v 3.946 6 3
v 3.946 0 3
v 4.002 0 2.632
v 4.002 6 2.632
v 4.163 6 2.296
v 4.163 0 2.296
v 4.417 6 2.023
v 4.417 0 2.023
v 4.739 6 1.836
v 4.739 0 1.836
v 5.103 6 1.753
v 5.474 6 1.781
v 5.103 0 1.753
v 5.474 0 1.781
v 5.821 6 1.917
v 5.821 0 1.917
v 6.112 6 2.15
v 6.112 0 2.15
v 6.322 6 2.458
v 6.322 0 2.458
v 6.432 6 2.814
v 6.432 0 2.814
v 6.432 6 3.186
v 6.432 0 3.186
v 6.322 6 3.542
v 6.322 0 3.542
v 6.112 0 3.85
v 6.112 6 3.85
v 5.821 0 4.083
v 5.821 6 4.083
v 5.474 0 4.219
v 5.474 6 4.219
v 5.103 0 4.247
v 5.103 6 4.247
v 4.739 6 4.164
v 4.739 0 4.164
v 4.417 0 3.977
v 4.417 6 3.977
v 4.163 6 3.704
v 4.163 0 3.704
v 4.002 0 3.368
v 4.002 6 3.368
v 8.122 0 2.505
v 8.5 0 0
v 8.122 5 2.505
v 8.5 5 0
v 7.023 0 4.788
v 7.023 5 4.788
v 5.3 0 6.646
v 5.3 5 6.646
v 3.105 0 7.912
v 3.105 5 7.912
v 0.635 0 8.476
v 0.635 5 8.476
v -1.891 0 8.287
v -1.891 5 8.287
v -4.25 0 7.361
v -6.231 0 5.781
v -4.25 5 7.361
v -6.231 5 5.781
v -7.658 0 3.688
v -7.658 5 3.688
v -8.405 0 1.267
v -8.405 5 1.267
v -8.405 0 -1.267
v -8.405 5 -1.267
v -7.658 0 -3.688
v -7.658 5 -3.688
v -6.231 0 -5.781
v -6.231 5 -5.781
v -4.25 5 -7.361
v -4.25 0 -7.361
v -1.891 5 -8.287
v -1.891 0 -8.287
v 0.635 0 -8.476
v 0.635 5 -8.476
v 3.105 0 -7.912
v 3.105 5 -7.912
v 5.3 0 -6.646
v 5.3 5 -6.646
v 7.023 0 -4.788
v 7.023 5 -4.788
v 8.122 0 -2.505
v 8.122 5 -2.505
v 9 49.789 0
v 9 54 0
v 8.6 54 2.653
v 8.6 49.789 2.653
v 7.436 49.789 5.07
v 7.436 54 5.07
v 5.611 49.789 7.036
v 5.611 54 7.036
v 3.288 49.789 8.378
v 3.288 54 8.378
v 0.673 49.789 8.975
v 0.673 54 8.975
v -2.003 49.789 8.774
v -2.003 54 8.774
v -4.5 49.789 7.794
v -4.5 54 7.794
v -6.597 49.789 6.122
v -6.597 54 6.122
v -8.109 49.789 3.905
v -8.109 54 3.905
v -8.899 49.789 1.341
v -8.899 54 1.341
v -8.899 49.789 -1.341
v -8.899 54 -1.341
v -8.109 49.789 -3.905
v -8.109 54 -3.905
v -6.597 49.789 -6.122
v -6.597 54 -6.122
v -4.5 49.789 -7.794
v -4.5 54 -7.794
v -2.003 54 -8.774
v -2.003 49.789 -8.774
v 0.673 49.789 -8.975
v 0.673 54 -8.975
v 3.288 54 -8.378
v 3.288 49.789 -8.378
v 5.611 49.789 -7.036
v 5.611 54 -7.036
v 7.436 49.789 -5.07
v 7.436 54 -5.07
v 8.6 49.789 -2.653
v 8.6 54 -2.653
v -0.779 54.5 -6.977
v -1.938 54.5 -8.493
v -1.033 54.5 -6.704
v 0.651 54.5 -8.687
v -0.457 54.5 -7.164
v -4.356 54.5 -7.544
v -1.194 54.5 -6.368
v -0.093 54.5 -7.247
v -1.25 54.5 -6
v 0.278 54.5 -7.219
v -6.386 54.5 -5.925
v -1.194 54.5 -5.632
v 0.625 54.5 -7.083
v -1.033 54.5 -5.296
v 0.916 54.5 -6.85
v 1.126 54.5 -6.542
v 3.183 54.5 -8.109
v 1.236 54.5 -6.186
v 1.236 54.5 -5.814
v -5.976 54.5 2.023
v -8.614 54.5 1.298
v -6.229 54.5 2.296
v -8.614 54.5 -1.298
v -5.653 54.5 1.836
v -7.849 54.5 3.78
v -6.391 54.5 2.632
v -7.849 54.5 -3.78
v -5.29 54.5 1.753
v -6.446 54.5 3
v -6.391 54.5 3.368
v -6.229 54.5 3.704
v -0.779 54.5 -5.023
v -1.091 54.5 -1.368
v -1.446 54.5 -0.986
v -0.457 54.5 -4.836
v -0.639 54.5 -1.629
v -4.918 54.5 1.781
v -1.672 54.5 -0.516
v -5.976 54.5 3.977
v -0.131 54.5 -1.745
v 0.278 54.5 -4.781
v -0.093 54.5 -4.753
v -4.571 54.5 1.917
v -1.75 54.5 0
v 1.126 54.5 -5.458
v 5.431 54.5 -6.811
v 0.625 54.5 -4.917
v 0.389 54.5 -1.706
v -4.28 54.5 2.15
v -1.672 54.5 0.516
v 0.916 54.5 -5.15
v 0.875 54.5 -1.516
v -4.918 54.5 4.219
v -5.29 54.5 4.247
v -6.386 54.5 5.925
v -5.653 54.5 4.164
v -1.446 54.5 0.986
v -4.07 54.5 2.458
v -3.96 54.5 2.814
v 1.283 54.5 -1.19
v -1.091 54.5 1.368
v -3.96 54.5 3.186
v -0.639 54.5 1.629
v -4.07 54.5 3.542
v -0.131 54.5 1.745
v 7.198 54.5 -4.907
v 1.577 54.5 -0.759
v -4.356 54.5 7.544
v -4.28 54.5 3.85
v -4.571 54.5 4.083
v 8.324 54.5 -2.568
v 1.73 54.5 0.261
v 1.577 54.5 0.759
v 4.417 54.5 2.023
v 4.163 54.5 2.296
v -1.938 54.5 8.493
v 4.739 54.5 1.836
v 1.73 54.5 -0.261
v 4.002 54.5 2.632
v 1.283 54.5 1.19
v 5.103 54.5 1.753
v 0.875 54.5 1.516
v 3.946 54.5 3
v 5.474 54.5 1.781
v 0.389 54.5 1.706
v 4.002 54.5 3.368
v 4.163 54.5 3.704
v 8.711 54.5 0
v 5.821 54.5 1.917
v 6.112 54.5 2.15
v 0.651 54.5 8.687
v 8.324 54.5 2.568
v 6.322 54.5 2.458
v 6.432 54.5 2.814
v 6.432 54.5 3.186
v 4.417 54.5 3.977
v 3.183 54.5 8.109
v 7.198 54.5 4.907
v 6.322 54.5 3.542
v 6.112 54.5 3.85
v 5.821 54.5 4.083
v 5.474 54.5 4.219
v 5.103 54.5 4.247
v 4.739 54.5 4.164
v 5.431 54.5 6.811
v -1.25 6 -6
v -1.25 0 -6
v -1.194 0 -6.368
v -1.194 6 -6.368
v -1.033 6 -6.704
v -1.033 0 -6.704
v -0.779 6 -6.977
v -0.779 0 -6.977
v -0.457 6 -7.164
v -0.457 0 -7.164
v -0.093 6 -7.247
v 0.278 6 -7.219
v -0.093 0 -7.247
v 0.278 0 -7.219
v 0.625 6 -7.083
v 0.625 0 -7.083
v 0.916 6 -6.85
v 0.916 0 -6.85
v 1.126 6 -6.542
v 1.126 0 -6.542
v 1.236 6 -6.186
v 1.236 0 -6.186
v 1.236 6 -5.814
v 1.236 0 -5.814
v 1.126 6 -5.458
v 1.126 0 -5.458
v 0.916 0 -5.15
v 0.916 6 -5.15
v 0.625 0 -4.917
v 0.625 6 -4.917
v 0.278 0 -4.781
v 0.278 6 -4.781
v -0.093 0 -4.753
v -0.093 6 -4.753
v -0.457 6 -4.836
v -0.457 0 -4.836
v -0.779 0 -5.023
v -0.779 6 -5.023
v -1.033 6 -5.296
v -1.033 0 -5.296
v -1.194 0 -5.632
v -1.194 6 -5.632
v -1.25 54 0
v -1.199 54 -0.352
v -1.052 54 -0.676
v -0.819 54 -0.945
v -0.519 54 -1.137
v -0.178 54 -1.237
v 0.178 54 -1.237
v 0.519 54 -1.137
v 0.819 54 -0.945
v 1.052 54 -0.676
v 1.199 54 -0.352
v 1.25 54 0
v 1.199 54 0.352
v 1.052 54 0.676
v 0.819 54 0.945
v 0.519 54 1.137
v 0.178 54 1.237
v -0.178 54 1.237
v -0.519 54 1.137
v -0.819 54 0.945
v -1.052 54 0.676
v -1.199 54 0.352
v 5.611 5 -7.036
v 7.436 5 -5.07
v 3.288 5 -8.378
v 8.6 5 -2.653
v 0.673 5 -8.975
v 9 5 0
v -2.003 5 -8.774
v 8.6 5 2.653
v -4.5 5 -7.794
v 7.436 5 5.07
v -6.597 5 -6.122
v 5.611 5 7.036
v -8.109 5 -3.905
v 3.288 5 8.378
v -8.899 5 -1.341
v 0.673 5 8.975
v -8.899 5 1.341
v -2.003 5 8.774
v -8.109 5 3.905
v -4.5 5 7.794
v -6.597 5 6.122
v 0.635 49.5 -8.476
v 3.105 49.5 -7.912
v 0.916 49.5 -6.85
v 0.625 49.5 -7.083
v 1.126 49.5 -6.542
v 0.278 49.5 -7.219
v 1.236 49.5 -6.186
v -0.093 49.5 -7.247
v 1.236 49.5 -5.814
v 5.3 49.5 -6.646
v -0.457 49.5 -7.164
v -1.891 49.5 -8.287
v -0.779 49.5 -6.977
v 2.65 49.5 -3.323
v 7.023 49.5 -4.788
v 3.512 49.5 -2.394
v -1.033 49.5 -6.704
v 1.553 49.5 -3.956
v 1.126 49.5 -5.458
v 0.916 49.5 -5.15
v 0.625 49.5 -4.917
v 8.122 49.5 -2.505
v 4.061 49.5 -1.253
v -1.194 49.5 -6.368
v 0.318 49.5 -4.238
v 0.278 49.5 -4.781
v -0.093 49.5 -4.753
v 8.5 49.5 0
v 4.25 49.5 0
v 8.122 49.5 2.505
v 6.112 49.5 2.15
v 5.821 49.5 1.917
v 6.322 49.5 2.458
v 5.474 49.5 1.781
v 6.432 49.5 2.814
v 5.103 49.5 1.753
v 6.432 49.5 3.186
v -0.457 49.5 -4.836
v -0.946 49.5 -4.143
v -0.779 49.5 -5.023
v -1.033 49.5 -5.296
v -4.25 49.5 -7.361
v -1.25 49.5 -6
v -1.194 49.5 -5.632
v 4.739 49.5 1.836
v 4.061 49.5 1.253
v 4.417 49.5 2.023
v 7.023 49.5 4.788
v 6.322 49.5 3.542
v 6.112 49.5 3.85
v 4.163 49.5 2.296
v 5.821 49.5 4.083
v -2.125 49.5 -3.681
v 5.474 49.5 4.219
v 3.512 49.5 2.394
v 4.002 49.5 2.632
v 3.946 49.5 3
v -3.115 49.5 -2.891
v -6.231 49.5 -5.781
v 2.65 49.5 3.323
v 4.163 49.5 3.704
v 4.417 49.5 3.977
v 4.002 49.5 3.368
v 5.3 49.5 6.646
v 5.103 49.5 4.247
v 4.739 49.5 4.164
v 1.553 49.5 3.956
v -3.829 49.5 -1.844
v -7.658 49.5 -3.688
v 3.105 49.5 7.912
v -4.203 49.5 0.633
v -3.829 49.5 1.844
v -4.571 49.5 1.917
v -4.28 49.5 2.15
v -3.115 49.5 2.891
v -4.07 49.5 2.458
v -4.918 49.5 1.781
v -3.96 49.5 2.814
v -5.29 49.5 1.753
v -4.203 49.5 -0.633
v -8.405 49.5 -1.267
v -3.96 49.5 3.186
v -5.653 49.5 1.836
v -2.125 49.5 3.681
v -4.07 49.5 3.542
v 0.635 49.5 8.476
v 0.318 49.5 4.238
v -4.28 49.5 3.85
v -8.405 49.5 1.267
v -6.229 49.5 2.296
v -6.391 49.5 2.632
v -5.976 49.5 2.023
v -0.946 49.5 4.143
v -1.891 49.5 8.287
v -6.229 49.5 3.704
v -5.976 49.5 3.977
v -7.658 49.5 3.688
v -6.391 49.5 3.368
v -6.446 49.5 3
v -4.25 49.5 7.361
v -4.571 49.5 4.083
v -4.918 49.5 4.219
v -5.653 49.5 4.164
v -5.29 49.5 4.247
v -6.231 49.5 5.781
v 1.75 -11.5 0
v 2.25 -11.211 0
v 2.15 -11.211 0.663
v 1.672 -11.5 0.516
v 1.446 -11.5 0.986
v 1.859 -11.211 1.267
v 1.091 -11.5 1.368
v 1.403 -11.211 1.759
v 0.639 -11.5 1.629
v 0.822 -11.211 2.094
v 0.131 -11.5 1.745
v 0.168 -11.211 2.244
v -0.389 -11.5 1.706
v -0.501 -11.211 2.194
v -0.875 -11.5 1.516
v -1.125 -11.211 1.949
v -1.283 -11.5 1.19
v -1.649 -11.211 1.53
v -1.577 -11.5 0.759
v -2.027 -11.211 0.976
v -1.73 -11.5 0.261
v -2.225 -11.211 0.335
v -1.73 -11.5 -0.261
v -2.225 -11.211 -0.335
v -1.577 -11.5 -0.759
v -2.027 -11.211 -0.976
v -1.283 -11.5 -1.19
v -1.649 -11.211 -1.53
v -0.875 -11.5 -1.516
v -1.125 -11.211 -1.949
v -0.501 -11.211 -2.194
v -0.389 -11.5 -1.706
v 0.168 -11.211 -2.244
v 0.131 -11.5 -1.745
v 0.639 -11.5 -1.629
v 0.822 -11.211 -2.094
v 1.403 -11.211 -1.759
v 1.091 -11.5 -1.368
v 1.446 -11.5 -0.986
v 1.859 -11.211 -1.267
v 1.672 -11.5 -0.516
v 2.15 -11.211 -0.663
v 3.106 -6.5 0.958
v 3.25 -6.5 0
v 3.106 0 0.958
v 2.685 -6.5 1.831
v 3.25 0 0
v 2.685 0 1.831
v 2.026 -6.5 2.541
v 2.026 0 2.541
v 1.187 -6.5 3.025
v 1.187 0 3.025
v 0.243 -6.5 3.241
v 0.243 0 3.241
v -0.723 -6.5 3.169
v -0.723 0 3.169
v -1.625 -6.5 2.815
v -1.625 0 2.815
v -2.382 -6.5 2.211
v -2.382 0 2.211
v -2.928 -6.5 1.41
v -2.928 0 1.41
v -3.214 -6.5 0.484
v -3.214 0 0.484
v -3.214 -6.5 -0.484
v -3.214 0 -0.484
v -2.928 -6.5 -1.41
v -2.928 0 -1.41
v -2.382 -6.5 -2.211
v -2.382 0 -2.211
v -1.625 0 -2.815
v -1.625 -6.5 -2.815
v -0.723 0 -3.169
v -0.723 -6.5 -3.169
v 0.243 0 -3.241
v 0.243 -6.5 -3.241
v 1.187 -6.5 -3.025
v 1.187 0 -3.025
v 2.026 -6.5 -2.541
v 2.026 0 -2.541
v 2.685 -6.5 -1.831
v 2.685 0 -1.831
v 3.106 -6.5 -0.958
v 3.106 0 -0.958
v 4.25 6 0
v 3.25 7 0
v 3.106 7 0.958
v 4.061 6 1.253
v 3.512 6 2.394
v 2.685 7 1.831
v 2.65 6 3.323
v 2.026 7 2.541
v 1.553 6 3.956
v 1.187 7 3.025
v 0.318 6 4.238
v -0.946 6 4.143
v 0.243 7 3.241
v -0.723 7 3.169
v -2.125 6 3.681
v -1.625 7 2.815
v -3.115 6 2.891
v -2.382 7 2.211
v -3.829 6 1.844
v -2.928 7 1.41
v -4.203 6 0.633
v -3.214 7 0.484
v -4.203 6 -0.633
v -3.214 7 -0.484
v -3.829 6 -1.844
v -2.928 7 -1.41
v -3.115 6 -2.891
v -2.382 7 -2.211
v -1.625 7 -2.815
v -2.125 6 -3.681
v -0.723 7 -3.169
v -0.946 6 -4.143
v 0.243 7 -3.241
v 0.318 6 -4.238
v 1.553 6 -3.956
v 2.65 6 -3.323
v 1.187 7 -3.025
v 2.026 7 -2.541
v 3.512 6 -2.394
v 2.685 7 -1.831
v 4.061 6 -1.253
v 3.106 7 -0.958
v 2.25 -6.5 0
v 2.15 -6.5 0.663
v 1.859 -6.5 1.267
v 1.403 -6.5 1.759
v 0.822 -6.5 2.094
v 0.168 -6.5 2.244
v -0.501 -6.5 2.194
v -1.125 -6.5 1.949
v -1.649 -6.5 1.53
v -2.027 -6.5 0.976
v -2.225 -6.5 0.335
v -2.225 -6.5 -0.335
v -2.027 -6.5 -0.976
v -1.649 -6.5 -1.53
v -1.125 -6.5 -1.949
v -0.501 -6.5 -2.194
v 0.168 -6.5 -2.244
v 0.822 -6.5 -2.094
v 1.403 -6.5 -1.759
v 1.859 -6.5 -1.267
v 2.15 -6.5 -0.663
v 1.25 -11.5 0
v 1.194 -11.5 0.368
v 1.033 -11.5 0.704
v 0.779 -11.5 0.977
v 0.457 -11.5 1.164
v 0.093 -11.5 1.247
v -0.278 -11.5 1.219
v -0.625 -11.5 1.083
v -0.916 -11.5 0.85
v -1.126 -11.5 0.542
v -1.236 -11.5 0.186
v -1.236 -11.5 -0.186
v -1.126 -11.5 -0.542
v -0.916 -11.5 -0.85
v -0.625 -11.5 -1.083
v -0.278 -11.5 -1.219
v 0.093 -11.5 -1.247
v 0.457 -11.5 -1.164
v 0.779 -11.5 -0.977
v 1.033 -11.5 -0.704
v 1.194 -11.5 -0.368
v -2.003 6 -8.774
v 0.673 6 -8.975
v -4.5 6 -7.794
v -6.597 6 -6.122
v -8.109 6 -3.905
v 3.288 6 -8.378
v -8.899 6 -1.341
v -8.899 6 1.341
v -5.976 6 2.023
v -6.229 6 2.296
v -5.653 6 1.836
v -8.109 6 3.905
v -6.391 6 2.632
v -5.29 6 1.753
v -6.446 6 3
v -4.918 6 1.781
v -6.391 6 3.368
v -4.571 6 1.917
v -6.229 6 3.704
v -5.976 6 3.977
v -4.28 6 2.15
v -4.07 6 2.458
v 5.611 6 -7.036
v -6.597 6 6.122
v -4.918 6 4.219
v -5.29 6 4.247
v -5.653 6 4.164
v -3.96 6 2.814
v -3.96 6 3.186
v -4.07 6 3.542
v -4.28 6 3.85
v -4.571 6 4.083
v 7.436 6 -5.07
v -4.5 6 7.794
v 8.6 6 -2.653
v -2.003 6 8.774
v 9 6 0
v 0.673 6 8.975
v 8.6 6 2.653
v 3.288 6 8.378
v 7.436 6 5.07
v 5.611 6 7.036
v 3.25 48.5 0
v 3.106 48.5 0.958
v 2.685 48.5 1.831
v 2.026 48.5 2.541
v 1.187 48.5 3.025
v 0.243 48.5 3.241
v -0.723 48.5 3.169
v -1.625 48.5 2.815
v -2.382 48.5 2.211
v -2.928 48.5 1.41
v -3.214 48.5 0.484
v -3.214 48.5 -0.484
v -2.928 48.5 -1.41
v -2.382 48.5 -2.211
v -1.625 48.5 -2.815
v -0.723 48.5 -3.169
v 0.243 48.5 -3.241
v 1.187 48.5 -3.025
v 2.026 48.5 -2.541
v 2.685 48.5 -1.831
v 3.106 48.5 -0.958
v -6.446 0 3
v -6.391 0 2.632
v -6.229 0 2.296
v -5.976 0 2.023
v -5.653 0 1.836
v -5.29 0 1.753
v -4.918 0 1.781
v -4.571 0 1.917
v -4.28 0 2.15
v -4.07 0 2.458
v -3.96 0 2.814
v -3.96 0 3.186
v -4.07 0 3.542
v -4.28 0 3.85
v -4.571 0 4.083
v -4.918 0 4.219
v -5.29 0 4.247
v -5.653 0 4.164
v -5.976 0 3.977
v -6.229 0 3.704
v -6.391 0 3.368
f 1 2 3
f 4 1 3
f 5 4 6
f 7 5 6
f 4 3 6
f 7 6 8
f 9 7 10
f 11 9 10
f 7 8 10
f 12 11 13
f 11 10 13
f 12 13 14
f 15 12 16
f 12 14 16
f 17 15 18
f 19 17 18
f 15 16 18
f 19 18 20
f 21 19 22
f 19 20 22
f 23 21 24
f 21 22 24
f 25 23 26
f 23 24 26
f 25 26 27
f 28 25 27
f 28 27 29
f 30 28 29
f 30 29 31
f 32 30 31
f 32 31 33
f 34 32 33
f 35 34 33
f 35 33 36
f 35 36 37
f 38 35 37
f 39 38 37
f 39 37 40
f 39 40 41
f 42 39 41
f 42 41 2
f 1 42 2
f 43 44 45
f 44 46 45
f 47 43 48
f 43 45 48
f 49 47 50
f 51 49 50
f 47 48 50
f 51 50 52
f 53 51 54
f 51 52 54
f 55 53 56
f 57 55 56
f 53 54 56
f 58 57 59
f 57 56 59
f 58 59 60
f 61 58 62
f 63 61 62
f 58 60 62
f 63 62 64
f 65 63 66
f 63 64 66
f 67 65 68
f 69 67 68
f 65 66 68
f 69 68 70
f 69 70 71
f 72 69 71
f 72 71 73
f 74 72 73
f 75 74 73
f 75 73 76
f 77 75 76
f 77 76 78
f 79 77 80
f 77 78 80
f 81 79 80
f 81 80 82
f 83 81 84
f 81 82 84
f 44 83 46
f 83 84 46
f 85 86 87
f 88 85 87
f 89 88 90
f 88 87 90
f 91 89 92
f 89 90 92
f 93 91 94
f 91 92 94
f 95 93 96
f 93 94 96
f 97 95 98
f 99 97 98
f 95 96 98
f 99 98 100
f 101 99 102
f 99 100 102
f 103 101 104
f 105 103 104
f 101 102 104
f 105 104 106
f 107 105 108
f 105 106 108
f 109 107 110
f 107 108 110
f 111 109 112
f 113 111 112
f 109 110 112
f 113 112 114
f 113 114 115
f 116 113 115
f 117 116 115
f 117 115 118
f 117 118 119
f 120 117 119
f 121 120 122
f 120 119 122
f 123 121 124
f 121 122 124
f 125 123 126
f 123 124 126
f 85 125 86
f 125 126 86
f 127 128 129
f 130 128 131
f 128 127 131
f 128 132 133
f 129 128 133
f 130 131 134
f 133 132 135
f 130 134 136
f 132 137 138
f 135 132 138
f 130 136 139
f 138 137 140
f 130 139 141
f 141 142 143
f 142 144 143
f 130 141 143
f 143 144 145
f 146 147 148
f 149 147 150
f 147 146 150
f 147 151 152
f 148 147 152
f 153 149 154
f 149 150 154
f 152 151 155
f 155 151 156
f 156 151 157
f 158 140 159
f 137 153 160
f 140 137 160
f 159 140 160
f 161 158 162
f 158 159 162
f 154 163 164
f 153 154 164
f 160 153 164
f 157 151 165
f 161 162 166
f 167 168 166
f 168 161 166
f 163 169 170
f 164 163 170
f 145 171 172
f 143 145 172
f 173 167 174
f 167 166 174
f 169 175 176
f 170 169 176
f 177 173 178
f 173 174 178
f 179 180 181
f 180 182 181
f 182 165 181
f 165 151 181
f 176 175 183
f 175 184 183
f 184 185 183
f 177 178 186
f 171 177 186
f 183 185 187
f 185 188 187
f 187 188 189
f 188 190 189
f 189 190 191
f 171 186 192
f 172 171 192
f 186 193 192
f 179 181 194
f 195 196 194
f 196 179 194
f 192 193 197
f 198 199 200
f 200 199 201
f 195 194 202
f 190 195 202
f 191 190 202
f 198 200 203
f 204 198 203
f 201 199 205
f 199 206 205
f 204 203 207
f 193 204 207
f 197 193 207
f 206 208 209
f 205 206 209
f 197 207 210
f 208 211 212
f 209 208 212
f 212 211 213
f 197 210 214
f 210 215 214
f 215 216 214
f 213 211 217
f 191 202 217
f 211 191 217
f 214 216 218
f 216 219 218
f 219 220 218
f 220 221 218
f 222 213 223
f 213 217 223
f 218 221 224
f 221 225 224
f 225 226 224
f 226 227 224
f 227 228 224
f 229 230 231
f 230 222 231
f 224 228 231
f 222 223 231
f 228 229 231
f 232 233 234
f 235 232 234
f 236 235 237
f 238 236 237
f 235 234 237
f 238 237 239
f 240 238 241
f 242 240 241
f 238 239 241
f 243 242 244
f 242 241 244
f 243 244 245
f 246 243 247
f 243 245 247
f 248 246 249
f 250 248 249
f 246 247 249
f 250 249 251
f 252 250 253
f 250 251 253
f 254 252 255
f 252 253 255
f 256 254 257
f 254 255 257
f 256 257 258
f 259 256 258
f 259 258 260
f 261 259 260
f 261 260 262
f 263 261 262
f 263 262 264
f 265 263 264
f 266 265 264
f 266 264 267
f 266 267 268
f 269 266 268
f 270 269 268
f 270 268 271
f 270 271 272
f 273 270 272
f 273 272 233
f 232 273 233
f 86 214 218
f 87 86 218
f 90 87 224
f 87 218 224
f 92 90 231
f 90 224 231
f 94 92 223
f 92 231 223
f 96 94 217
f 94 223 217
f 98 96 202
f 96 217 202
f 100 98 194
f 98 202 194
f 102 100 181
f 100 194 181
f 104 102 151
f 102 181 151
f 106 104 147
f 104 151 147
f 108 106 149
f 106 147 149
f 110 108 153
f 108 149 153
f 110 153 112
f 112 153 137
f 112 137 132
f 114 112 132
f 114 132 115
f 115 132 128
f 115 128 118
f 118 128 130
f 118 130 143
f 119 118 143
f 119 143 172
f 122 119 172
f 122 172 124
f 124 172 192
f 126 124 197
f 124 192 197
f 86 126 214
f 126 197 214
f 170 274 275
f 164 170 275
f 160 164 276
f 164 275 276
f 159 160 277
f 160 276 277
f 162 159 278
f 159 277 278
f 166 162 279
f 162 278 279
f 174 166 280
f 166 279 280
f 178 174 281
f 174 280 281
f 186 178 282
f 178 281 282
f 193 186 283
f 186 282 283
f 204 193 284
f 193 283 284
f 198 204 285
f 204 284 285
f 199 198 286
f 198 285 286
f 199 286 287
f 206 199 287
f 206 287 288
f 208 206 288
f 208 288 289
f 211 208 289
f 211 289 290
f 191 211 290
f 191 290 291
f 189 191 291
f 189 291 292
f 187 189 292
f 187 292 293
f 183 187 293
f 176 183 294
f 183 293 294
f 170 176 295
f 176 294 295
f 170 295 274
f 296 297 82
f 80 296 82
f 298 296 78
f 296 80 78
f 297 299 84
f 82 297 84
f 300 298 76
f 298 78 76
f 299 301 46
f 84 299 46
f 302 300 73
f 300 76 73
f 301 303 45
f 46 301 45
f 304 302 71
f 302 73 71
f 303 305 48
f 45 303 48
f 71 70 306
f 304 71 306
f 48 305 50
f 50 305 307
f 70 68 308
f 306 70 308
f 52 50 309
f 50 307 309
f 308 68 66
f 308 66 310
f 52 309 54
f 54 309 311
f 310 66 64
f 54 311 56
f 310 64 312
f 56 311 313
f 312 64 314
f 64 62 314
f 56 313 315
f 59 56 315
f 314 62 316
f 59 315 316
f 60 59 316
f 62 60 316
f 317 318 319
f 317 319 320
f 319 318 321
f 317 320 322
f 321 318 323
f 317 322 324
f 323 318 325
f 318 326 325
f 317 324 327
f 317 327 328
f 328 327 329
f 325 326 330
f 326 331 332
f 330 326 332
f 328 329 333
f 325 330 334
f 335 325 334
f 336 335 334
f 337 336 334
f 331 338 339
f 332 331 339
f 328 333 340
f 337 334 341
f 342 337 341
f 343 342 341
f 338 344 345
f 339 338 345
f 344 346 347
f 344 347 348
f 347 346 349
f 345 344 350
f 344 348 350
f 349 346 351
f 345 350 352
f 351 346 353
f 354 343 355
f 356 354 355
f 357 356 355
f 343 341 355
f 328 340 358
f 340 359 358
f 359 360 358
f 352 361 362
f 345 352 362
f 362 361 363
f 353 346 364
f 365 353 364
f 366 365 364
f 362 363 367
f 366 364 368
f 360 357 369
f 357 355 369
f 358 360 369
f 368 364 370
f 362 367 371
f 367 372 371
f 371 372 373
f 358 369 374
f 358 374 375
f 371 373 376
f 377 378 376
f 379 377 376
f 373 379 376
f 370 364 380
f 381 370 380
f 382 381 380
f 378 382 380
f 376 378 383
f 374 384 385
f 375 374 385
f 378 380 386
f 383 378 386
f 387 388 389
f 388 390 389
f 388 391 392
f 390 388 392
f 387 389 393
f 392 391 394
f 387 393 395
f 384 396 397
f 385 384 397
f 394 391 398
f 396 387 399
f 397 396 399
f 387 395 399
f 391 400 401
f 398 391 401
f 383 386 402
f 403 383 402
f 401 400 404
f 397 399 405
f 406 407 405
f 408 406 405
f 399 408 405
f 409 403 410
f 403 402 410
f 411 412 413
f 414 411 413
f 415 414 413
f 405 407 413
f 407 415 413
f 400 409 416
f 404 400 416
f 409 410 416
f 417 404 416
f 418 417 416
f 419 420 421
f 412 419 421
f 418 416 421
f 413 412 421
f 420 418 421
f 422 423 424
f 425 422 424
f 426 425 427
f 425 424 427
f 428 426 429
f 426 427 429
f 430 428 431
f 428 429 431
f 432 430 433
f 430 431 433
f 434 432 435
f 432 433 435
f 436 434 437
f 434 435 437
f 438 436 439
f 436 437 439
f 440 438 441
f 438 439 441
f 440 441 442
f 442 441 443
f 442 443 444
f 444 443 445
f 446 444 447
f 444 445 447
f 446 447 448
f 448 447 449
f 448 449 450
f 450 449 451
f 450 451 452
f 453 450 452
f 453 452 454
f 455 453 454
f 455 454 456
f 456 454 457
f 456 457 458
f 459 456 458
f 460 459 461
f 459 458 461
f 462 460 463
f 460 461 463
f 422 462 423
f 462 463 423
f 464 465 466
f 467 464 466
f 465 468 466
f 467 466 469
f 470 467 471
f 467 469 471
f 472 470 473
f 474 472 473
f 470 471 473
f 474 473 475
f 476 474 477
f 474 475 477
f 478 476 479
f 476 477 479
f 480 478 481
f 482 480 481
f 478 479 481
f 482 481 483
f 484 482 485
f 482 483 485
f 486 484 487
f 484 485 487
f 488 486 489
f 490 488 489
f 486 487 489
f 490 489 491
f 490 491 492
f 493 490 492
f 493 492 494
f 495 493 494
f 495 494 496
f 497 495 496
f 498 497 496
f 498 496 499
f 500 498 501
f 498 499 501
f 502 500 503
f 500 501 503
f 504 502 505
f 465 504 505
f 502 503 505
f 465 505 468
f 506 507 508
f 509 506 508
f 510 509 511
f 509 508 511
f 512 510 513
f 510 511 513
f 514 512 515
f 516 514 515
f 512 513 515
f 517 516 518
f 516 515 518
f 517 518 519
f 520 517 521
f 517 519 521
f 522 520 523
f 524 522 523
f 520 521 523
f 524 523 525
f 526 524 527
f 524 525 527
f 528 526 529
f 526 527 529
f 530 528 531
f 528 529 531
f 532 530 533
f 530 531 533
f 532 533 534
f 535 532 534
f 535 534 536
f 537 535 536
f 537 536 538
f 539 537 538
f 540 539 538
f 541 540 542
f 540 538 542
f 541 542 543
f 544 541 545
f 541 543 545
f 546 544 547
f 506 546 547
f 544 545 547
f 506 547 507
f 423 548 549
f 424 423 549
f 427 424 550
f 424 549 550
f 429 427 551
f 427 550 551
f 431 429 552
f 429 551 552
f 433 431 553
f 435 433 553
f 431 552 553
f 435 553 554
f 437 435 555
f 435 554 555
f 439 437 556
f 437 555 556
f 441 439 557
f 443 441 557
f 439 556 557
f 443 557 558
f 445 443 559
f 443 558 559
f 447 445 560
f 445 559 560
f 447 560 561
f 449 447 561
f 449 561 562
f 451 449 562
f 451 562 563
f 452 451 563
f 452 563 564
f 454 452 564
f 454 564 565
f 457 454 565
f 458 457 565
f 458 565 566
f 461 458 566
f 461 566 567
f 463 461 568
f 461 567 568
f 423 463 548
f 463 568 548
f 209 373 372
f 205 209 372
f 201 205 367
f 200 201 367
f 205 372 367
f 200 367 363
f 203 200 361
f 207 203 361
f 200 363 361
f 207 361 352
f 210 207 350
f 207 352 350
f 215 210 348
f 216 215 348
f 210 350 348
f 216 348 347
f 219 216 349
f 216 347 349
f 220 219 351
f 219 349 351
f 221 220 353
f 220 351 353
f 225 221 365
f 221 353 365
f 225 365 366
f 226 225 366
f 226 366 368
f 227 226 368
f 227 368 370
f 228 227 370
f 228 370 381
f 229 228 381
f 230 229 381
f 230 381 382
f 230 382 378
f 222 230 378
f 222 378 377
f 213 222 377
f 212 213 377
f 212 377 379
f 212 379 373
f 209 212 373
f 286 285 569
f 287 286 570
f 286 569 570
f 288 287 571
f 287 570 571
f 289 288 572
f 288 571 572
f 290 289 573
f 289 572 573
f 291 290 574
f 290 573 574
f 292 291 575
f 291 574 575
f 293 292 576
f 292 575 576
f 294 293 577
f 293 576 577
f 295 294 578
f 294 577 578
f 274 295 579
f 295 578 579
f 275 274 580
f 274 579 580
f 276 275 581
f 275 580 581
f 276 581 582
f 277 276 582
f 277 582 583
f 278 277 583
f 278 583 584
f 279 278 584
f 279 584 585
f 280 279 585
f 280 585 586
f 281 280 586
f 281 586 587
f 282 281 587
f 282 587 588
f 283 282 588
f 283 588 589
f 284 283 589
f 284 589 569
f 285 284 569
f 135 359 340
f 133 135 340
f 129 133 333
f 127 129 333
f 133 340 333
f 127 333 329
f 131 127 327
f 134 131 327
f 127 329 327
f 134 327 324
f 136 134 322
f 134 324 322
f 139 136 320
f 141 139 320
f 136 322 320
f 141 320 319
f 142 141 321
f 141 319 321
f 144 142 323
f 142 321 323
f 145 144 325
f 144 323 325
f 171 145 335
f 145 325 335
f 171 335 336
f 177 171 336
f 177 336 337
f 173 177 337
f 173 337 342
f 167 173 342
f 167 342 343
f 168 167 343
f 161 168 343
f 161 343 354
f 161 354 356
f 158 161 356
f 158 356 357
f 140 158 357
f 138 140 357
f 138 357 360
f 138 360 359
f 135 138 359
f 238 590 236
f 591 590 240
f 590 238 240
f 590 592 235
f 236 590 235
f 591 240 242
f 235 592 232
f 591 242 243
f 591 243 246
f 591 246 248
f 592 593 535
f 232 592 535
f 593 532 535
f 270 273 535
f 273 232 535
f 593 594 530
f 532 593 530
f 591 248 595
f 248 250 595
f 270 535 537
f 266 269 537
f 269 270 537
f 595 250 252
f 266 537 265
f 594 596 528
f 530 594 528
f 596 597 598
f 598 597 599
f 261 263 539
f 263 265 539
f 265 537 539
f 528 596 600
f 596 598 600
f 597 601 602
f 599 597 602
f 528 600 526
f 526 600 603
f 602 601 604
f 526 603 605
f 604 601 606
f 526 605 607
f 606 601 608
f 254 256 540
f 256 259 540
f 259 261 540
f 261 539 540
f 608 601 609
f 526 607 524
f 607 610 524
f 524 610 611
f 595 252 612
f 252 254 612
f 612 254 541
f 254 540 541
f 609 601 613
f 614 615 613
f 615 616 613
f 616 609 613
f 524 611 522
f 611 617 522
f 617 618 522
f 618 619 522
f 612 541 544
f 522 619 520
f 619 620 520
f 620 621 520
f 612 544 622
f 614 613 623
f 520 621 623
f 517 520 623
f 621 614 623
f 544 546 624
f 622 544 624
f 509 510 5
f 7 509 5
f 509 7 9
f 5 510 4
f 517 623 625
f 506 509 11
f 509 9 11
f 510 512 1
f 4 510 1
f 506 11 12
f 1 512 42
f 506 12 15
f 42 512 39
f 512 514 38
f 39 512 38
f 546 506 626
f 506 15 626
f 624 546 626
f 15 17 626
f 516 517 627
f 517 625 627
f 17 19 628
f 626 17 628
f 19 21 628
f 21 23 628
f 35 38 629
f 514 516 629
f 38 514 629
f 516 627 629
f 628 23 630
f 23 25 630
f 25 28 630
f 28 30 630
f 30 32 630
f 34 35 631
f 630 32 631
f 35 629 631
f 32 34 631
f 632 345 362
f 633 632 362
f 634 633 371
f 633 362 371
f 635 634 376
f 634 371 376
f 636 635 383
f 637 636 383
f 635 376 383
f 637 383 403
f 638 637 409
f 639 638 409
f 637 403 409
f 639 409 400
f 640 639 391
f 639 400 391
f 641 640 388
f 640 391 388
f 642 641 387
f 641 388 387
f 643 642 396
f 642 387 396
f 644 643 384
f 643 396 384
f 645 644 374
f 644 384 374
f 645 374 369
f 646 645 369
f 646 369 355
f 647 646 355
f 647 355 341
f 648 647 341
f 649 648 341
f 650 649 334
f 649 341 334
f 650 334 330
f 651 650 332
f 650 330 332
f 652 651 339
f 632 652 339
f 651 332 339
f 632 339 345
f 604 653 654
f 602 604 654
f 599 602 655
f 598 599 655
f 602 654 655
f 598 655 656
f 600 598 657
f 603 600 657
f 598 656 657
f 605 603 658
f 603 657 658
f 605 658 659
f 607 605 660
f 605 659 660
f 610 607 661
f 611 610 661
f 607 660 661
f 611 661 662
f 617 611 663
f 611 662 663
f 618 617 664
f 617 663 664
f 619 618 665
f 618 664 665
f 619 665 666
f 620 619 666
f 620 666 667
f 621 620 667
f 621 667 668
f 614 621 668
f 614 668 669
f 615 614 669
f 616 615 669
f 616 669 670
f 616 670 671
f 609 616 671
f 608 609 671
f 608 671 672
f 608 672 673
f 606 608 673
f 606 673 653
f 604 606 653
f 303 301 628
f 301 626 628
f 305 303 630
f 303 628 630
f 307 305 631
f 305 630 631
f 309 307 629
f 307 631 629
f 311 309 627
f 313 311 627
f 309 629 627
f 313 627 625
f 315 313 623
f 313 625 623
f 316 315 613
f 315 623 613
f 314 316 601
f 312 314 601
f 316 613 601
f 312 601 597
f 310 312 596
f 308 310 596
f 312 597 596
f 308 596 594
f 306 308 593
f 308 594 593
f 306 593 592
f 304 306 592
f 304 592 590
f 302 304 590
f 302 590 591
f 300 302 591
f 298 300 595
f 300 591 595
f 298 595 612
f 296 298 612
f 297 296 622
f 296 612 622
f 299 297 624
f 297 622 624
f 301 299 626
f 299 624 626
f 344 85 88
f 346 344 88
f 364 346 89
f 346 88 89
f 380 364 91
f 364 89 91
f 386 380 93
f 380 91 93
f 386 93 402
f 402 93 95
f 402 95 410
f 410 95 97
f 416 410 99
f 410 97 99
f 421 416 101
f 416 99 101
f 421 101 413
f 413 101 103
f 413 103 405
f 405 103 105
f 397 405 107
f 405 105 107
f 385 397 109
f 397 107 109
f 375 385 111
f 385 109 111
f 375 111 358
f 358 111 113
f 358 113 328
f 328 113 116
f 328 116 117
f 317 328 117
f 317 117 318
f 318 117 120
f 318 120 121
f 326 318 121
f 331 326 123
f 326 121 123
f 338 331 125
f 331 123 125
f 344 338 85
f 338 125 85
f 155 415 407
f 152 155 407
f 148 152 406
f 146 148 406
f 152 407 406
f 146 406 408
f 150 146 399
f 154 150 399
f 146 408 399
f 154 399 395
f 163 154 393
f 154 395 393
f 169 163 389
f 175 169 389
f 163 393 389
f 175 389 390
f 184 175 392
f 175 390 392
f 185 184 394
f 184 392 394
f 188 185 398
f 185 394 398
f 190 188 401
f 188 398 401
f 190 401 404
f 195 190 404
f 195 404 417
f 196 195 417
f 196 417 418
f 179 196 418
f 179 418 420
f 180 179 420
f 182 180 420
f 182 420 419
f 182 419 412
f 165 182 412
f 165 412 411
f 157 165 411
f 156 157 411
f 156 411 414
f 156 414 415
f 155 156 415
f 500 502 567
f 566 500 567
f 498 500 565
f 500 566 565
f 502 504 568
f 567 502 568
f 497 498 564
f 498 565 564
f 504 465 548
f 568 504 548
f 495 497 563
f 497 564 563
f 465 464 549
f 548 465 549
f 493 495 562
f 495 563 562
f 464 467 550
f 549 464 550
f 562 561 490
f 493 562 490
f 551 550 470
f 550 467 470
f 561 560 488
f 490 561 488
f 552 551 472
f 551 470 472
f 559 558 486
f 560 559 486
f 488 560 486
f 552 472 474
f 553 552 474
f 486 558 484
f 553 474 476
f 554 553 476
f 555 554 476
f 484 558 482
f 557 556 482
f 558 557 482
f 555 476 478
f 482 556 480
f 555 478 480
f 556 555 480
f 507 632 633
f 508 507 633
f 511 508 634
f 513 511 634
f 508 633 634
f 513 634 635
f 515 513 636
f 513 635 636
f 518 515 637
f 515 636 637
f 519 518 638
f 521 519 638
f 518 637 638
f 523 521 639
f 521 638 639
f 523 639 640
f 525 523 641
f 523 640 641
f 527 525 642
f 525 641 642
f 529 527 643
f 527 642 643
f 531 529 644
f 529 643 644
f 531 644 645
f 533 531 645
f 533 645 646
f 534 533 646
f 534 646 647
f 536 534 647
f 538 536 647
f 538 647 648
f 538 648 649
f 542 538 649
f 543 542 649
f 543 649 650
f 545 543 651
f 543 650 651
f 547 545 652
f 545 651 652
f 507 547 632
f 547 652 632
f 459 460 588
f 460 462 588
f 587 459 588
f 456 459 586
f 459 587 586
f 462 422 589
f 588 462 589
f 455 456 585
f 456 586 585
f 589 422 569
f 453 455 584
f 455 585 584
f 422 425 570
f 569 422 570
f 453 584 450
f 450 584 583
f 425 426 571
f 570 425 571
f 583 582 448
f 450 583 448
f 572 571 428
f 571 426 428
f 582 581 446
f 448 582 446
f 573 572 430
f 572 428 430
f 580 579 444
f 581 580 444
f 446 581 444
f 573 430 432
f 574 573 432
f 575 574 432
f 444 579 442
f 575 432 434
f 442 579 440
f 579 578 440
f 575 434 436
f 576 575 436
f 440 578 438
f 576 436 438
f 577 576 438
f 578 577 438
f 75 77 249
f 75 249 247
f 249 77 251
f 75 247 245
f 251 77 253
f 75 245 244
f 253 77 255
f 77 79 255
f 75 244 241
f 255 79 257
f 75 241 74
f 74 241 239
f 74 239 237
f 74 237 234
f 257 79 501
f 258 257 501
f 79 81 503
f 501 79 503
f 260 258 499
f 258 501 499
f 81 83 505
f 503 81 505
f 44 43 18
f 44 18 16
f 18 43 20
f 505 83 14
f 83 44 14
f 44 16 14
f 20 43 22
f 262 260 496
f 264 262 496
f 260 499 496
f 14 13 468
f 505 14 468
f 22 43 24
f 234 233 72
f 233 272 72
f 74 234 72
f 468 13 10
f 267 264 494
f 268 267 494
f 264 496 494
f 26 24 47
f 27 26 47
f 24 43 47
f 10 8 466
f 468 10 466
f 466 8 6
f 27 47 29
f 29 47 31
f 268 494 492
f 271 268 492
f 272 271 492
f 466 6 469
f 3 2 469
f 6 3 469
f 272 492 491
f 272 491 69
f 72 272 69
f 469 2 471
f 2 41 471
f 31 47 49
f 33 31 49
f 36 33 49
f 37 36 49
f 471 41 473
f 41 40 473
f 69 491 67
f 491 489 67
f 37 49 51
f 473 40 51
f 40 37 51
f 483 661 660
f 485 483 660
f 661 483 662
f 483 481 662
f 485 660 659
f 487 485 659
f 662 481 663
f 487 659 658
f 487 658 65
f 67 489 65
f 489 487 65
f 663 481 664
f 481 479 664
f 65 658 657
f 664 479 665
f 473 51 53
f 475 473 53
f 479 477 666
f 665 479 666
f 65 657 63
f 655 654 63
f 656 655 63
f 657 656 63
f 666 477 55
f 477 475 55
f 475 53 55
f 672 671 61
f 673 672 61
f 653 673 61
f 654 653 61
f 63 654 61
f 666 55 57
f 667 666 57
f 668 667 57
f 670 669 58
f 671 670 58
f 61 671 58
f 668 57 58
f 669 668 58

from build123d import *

# Parameters (mm, degrees)
HOLE_WIZARD_M3_1_D           = 2.5
CHAMFER_1_SIZE               = 1
CHAMFER_2_SIZE               = 0.5
CHAMFER_2_SIZE2              = 0.288675135
CHAMFER_2_PART_2_SIZE        = 0.5
CHAMFER_2_PART_2_SIZE2       = 0.288675135
CHAMFER_2_PART_3_SIZE        = 0.5
CHAMFER_2_PART_3_SIZE2       = 0.288675135
HOLE_WIZARD_M3_2_D           = 2.5
HOLE_WIZARD_M3_2_DEPTH       = 6
HOLE_WIZARD_M3_2_CSINK_D     = 3.5
HOLE_WIZARD_M3_2_CSINK_ANGLE = 90
HOLE_WIZARD_M3_2_TIP         = 0.751075774


with BuildPart() as part:
    # 草图2 → 旋转1 (revolve)
    with BuildSketch(Plane.XY):
        Polygon((3.25, 0), (8.5, 0), (8.5, 5), (9, 5), (9, 6), (3.25, 6), (3.25, 49.5), (9, 49.5), (9, 54.5), (1.25, 54.5), (1.25, -11.5), (2.25, -11.5), (2.25, -6.5), (3.25, -6.5), align=None)
    revolve(axis=Axis((0, 60, 0), (0, -1, 0)))

    # M3 螺纹孔1 (through all)
    with Locations(Plane(origin=(0, 54.5, 0), x_dir=(1, 0, 0), z_dir=(0, 1, 0))):
        with Locations((-5.196152423, -3), (0, 6), (5.196152423, -3)):
            Hole(HOLE_WIZARD_M3_1_D / 2)

    # 倒角1
    chamfer_1_edges = [part.edges().sort_by_distance(p)[0] for p in [
        (-3.25, 6, 0),
        (-3.25, 49.5, 0),
    ]]
    chamfer(chamfer_1_edges, length=CHAMFER_1_SIZE)

    # 倒角2
    chamfer_2_edges = [part.edges().sort_by_distance(p)[0] for p in [
        (-9, 49.5, 0),
    ]]
    chamfer_2_side = [part.faces().sort_by_distance(p)[0] for p in [
        (-4.504558441, 49.5, 0),
    ]]
    chamfer(chamfer_2_edges, length=CHAMFER_2_SIZE, length2=CHAMFER_2_SIZE2, reference=chamfer_2_side[0])

    # 倒角2 part 2
    chamfer_2_part_2_edges = [part.edges().sort_by_distance(p)[0] for p in [
        (-9, 54.5, 0),
    ]]
    chamfer_2_part_2_side = [part.faces().sort_by_distance(p)[0] for p in [
        (-9, 52, 0),
    ]]
    chamfer(chamfer_2_part_2_edges, length=CHAMFER_2_PART_2_SIZE, length2=CHAMFER_2_PART_2_SIZE2, reference=chamfer_2_part_2_side[0])

    # 倒角2 part 3
    chamfer_2_part_3_edges = [part.edges().sort_by_distance(p)[0] for p in [
        (-2.25, -11.5, 0),
    ]]
    chamfer_2_part_3_side = [part.faces().sort_by_distance(p)[0] for p in [
        (-1.31363961, -11.5, 0),
    ]]
    chamfer(chamfer_2_part_3_edges, length=CHAMFER_2_PART_3_SIZE, length2=CHAMFER_2_PART_3_SIZE2, reference=chamfer_2_part_3_side[0])

    # M3 螺纹孔2
    with Locations(Plane(origin=(0, 54.5, 0), x_dir=(1, 0, 0), z_dir=(0, 1, 0))):
        with Locations((0, 0)):
            CounterSinkHole(HOLE_WIZARD_M3_2_D / 2, HOLE_WIZARD_M3_2_CSINK_D / 2, depth=HOLE_WIZARD_M3_2_DEPTH, counter_sink_angle=HOLE_WIZARD_M3_2_CSINK_ANGLE)
            with Locations((0, 0, -(HOLE_WIZARD_M3_2_DEPTH + HOLE_WIZARD_M3_2_TIP / 2))):  # 118° drill point
                Cone(0, HOLE_WIZARD_M3_2_D / 2, HOLE_WIZARD_M3_2_TIP, mode=Mode.SUBTRACT)


solid = part.part
